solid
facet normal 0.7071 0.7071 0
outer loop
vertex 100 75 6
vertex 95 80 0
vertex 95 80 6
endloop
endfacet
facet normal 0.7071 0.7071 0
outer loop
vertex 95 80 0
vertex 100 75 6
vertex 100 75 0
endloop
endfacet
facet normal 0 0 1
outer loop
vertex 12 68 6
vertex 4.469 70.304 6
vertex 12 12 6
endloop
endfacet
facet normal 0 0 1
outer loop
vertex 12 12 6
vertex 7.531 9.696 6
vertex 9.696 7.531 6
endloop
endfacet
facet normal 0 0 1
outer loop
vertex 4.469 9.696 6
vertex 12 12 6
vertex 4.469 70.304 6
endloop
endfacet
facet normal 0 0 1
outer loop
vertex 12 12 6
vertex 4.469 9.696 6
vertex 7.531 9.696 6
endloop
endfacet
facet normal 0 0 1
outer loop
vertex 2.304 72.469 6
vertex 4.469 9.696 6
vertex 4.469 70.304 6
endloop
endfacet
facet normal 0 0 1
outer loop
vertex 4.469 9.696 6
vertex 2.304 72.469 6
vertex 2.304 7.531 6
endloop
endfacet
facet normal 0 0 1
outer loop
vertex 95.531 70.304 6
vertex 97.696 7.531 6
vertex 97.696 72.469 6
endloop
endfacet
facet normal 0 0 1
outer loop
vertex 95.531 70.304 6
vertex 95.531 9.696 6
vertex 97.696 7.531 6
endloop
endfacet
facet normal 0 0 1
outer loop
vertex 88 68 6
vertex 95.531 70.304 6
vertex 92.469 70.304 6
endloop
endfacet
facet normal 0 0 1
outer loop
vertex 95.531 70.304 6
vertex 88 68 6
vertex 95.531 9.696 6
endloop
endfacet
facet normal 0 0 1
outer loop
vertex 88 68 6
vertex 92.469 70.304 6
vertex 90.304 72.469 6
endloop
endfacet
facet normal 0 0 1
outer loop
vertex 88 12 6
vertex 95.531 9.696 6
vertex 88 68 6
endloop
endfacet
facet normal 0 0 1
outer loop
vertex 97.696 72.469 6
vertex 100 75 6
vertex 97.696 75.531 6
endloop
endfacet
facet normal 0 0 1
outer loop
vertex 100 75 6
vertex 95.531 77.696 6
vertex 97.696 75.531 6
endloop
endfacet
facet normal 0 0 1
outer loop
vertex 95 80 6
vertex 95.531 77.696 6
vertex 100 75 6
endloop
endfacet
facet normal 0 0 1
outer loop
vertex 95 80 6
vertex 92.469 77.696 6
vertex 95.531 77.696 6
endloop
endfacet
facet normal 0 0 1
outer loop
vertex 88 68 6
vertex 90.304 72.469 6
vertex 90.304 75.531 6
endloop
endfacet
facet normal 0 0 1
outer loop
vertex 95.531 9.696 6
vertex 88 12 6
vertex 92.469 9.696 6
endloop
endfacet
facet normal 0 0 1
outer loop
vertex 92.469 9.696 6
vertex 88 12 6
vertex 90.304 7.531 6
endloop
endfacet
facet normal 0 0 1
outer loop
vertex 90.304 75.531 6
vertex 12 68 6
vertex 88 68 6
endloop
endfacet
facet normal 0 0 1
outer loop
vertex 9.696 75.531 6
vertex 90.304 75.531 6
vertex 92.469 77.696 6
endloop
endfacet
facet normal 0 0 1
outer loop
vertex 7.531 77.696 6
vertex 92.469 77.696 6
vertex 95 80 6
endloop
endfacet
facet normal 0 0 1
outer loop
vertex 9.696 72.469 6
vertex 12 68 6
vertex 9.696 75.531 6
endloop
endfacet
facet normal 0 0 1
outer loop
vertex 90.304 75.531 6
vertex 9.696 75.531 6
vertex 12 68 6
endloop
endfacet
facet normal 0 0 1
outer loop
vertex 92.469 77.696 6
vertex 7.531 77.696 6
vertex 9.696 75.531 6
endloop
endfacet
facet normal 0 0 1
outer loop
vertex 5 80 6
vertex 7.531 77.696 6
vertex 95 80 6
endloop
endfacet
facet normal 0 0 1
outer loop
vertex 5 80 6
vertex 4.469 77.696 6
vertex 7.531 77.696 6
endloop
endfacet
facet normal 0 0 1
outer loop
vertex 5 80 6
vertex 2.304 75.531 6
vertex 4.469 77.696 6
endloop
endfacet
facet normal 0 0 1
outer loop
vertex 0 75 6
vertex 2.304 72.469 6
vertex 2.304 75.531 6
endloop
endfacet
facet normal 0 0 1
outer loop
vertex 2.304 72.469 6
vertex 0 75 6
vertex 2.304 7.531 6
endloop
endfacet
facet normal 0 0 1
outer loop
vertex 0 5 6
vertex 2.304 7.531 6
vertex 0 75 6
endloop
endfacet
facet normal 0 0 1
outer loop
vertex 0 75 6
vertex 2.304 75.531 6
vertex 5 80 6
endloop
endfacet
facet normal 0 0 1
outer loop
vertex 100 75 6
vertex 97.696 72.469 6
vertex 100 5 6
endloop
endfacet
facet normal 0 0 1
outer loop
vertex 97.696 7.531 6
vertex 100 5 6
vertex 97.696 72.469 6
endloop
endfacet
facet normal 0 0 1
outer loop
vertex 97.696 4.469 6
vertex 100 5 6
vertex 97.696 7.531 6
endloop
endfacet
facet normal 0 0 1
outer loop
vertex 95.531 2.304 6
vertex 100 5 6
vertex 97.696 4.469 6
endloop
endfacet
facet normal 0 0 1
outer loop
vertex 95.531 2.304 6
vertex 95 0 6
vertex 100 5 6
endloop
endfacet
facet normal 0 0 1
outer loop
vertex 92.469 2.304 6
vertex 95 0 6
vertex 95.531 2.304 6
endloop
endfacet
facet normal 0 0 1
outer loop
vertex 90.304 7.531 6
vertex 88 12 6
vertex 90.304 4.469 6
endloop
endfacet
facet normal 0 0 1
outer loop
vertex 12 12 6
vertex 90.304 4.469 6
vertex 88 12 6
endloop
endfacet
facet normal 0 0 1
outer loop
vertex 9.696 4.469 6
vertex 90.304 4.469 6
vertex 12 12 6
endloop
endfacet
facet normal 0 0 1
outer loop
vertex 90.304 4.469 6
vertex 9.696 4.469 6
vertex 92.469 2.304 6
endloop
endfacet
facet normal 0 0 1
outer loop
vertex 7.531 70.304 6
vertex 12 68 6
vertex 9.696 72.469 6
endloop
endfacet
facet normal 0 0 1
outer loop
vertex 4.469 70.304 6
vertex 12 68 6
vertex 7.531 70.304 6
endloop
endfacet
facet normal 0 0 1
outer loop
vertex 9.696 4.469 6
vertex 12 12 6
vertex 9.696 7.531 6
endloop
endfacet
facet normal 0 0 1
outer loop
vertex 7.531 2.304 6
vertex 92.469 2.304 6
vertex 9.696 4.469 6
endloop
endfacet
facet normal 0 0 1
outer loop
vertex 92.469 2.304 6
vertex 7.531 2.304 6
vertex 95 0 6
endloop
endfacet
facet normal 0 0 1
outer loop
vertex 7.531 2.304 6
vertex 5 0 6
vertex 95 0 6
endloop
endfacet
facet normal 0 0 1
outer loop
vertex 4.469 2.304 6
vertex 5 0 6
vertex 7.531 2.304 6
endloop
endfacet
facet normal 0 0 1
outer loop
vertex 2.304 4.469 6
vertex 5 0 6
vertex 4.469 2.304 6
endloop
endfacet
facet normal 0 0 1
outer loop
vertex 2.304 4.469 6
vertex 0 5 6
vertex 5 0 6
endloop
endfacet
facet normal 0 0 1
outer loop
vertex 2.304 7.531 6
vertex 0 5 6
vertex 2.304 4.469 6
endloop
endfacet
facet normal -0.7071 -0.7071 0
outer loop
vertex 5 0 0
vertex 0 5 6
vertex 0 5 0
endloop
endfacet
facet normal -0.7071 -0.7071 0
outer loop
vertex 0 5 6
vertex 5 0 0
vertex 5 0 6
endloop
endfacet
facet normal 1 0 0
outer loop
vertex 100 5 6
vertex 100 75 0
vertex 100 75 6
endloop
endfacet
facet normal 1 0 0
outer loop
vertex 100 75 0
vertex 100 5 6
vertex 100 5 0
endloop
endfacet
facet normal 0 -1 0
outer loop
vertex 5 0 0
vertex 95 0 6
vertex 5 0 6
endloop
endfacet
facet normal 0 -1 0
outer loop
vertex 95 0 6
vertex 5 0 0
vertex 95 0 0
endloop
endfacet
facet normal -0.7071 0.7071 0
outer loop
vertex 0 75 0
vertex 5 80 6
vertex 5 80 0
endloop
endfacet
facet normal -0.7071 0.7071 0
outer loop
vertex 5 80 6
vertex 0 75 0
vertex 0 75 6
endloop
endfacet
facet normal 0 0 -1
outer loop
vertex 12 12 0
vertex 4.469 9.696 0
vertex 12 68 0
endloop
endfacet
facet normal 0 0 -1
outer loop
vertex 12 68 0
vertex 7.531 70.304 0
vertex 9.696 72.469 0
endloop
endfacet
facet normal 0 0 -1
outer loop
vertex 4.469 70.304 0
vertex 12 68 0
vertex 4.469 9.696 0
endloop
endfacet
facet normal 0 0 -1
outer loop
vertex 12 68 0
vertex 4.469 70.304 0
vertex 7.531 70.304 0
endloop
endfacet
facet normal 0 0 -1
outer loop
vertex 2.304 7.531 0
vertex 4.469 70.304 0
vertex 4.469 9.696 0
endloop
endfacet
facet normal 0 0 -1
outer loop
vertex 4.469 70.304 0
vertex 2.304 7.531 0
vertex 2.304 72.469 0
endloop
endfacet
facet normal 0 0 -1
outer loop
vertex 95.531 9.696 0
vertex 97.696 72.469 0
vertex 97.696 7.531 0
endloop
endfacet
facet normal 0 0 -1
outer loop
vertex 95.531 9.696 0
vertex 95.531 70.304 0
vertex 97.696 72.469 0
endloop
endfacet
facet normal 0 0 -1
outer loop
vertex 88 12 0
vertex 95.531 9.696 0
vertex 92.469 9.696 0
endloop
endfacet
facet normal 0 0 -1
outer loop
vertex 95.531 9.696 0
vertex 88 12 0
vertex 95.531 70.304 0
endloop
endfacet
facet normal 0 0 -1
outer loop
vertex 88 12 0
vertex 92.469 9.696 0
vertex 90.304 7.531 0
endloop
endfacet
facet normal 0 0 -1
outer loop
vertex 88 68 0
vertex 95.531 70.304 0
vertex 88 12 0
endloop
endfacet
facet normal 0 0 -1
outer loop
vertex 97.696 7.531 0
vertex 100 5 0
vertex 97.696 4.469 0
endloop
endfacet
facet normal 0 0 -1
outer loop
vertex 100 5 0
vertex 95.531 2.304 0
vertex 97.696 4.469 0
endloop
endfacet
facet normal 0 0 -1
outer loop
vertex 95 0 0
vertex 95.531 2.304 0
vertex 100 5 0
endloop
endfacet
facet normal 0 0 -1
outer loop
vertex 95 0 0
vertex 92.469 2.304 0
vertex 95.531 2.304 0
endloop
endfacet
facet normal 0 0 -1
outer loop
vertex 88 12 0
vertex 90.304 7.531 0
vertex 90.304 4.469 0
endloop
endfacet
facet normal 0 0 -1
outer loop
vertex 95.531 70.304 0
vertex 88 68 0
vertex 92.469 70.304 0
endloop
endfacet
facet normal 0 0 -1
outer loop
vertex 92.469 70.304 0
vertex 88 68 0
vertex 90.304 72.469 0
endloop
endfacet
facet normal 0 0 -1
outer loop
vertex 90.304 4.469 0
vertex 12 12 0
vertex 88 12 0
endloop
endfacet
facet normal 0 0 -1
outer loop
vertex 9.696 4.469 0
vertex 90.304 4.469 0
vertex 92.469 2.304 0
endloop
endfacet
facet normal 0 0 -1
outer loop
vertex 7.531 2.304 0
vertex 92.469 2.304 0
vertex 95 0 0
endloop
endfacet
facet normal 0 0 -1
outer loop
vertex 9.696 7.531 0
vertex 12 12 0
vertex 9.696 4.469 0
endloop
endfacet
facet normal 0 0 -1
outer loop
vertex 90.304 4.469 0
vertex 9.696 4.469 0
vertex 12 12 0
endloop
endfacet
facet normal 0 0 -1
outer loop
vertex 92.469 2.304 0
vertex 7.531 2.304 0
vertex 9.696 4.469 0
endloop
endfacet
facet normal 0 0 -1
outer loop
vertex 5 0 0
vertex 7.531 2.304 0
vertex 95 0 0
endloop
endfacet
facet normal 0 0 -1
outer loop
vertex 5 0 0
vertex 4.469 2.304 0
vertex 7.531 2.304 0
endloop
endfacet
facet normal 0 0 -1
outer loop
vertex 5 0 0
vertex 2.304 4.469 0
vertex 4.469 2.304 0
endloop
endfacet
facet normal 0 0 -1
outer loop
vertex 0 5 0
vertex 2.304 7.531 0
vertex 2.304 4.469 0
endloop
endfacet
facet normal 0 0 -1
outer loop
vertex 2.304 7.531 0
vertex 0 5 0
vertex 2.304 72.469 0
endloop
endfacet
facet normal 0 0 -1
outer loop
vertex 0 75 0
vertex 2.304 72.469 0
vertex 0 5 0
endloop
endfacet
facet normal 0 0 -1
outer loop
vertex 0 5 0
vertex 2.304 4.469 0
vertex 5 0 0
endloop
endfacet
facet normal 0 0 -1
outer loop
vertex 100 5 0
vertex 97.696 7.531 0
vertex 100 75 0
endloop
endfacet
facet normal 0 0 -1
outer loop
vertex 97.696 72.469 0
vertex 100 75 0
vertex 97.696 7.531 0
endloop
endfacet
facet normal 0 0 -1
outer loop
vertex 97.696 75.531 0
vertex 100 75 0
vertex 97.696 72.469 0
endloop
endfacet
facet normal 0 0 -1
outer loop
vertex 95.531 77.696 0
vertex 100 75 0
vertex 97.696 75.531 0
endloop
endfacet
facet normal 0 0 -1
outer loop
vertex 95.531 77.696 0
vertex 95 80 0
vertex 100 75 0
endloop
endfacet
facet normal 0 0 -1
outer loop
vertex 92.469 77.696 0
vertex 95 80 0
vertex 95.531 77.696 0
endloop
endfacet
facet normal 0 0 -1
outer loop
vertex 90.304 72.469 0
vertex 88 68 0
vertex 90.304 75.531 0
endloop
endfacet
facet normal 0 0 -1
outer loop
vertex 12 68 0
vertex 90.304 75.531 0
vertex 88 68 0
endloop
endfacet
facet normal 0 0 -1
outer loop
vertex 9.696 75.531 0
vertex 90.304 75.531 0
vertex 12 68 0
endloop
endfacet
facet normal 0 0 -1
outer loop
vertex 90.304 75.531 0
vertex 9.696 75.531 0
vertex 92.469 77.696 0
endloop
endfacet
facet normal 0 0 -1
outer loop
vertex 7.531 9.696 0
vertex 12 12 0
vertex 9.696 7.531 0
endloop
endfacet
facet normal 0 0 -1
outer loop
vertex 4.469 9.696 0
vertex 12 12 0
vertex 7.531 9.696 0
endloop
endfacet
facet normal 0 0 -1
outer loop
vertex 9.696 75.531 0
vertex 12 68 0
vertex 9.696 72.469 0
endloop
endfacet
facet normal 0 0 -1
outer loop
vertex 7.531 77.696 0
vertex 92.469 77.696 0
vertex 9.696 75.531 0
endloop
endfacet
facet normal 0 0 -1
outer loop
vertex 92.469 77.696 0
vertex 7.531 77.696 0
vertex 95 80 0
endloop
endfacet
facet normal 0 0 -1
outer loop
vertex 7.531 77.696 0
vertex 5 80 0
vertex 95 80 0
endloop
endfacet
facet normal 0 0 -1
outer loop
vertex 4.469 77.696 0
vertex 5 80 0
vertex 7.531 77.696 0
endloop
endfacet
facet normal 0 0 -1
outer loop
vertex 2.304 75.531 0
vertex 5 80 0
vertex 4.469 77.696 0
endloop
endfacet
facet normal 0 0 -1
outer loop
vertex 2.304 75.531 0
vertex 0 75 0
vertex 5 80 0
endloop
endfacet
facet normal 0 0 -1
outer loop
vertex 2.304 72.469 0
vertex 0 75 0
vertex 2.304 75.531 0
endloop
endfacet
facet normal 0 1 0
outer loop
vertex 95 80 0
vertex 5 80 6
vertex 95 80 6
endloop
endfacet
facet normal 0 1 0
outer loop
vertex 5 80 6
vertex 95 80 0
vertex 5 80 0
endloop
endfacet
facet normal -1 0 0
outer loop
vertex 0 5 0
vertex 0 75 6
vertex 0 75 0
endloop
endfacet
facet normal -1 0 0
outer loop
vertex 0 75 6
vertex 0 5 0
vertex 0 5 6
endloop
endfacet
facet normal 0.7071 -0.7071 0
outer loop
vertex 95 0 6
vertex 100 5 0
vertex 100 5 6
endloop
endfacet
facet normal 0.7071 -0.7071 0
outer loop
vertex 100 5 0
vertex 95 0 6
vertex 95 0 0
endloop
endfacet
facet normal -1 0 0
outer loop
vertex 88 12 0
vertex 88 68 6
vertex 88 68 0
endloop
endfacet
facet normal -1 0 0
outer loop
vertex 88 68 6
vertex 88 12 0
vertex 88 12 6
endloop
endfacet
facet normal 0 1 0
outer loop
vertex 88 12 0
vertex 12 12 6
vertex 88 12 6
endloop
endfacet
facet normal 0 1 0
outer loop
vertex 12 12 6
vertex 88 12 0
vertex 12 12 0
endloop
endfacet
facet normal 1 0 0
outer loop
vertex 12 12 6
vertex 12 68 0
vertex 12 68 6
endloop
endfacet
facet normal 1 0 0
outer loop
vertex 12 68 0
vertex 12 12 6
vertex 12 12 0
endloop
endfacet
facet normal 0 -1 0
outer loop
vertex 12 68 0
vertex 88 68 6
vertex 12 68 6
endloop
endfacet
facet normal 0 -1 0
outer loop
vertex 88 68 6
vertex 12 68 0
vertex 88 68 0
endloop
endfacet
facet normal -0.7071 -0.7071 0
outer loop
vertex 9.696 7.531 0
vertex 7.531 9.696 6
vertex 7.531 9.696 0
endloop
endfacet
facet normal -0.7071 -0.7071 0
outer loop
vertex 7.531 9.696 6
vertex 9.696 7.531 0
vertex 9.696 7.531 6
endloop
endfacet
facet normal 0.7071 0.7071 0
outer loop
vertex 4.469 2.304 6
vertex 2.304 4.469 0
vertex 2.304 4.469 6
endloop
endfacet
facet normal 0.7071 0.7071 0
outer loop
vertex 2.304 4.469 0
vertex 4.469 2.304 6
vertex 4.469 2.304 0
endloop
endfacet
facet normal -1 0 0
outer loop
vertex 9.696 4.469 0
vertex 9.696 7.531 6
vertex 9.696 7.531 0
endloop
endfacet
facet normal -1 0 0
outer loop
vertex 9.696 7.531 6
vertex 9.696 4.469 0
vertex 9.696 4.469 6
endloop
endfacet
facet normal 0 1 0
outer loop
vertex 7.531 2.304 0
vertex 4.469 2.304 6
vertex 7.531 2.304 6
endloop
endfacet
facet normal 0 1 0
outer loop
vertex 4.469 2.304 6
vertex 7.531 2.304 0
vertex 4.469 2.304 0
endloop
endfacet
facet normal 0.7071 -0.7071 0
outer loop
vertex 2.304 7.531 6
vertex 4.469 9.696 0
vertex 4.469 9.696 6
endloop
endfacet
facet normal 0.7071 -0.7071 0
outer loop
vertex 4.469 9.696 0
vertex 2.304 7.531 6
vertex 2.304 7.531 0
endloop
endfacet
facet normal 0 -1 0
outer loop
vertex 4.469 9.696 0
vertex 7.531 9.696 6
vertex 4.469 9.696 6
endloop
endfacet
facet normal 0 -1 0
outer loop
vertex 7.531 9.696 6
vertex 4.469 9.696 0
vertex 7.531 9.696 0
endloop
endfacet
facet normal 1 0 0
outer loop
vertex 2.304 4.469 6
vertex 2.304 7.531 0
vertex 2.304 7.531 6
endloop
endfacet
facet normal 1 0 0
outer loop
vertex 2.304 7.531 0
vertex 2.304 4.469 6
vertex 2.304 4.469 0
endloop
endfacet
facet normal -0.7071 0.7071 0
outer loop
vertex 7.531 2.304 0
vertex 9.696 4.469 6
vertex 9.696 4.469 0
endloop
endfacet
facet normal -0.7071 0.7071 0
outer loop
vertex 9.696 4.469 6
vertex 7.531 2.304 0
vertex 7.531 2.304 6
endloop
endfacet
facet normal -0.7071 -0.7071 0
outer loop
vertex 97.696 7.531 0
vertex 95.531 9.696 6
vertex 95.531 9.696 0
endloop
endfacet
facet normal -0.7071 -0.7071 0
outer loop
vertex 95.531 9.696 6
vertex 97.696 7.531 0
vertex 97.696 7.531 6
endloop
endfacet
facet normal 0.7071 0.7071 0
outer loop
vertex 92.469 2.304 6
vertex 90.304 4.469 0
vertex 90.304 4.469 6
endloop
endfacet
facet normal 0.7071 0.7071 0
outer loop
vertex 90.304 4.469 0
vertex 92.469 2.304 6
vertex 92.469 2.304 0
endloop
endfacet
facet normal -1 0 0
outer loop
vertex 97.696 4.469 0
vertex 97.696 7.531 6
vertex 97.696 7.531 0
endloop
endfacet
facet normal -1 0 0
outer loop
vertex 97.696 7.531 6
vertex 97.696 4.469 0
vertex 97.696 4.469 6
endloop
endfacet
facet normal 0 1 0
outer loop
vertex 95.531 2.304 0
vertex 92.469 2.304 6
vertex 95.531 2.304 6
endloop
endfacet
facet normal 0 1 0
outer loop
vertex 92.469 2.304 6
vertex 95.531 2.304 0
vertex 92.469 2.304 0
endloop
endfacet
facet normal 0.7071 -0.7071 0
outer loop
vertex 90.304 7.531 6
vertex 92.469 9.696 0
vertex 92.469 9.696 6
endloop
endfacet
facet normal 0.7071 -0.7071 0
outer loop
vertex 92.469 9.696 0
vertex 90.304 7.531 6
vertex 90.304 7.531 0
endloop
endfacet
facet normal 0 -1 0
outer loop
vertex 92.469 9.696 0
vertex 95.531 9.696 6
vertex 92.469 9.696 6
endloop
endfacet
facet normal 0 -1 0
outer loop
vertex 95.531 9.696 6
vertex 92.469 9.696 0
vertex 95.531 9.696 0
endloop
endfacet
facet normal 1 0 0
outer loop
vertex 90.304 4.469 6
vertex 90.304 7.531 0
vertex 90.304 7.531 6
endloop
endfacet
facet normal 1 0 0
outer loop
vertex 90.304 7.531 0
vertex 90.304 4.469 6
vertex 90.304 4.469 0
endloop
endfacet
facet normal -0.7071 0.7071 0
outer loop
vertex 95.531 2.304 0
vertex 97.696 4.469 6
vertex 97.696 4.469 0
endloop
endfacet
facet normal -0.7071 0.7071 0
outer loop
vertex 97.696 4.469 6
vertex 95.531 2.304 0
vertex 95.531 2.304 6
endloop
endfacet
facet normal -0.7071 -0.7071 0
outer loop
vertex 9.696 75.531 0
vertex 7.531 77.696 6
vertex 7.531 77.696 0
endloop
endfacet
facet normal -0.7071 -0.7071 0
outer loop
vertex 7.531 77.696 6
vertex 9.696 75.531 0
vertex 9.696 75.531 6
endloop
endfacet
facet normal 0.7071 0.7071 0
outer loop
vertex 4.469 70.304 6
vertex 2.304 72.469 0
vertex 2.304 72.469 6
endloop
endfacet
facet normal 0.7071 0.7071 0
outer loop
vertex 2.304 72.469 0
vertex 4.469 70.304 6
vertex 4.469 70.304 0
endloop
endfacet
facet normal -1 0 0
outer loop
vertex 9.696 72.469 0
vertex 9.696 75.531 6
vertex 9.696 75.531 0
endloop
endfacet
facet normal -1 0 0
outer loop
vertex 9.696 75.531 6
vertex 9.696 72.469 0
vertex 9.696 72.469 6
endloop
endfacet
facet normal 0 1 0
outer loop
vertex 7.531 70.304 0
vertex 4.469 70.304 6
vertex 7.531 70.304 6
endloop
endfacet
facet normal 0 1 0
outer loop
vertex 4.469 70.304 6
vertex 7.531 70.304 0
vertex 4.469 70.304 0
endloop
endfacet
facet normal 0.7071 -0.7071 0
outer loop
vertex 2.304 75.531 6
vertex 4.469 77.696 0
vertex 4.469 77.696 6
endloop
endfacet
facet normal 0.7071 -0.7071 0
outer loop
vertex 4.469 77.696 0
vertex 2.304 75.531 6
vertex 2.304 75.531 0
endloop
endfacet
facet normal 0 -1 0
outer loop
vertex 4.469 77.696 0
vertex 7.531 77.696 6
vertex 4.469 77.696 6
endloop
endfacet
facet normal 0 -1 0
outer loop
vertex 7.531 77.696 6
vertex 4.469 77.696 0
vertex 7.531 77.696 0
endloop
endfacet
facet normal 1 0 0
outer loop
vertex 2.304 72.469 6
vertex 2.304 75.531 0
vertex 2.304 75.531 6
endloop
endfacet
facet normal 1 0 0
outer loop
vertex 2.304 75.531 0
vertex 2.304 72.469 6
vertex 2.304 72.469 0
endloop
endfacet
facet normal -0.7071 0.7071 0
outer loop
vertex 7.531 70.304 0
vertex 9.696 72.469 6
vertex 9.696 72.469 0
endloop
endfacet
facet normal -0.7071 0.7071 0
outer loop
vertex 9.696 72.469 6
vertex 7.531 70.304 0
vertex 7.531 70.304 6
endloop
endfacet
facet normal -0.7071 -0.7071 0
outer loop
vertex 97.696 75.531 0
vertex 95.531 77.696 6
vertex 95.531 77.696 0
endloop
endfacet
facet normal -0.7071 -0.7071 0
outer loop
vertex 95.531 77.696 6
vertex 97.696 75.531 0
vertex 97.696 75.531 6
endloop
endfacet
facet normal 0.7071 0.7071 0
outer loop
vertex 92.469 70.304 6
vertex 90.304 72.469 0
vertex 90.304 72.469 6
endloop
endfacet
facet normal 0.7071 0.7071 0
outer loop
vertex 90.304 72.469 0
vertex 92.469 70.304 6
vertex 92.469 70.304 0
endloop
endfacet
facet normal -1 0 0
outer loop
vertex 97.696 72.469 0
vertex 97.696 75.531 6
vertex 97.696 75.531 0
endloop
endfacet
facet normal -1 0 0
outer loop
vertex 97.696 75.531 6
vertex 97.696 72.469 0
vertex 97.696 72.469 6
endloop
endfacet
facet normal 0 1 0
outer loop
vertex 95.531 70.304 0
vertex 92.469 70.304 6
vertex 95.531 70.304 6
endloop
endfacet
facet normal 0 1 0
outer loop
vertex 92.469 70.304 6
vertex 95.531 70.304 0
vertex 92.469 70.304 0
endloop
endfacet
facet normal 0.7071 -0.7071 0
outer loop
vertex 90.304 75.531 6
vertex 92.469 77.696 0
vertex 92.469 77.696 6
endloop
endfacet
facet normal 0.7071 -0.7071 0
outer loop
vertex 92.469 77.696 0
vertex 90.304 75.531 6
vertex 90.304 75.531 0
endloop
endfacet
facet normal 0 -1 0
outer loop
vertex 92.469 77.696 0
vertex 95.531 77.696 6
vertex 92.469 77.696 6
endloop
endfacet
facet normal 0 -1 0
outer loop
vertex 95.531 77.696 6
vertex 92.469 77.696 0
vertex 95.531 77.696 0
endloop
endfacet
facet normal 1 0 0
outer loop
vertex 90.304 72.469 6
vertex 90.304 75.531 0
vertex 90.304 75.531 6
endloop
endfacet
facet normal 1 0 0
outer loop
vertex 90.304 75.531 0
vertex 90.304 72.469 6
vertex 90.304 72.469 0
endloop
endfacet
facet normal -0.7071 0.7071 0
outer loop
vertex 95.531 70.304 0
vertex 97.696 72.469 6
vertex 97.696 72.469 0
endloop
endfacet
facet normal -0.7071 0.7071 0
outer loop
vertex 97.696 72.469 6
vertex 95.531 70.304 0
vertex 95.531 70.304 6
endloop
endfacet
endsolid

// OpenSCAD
$fn = 32;

// ----------------------------------------------------------------------
// Frame plate: 100 x 80 frame, 12 mm rails
// ----------------------------------------------------------------------

// --- parameters (mm) ---
plate_l = 100;            // plate length, X
plate_w = 80;             // plate width, Y
plate_t = 6;              // plate thickness, Z (extrusion height)
corner_c = 5;             // corner chamfer
frame_bar = 12;           // frame rail width
bolt_r = 4;               // corner bolt window radius
bolt_inset = 6;           // bolt centre inset from the edges
fit_tol = 0.1;            // declared fit tolerance (prompt contract)
free_tol = 0.5;           // declared free tolerance (prompt contract)

win_l = plate_l - 2 * frame_bar;  // window length
win_w = plate_w - 2 * frame_bar;  // window width
bolt_d = 2 * bolt_r;  // corner hole diameter

profile = [[5, 0], [95, 0], [100, 5], [100, 75], [95, 80], [5, 80], [0, 75], [0, 5]];  // primary outline, 8 points, counter clockwise
void_1 = [[12, 12], [88, 12], [88, 68], [12, 68]];  // the window, 4 points
void_2 = [[9.696, 7.531], [7.531, 9.696], [4.469, 9.696], [2.304, 7.531], [2.304, 4.469], [4.469, 2.304], [7.531, 2.304], [9.696, 4.469]];  // corner bolt window, 8 points
void_3 = [[97.696, 7.531], [95.531, 9.696], [92.469, 9.696], [90.304, 7.531], [90.304, 4.469], [92.469, 2.304], [95.531, 2.304], [97.696, 4.469]];  // corner bolt window, 8 points
void_4 = [[9.696, 75.531], [7.531, 77.696], [4.469, 77.696], [2.304, 75.531], [2.304, 72.469], [4.469, 70.304], [7.531, 70.304], [9.696, 72.469]];  // corner bolt window, 8 points
void_5 = [[97.696, 75.531], [95.531, 77.696], [92.469, 77.696], [90.304, 75.531], [90.304, 72.469], [92.469, 70.304], [95.531, 70.304], [97.696, 72.469]];  // corner bolt window, 8 points

// --- the one profile operation ---
difference() {
  linear_extrude(height = plate_t) polygon(points = profile);
  translate([0, 0, -1])
    linear_extrude(height = plate_t + 2) polygon(points = void_1);
  translate([0, 0, -1])
    linear_extrude(height = plate_t + 2) polygon(points = void_2);
  translate([0, 0, -1])
    linear_extrude(height = plate_t + 2) polygon(points = void_3);
  translate([0, 0, -1])
    linear_extrude(height = plate_t + 2) polygon(points = void_4);
  translate([0, 0, -1])
    linear_extrude(height = plate_t + 2) polygon(points = void_5);
}
